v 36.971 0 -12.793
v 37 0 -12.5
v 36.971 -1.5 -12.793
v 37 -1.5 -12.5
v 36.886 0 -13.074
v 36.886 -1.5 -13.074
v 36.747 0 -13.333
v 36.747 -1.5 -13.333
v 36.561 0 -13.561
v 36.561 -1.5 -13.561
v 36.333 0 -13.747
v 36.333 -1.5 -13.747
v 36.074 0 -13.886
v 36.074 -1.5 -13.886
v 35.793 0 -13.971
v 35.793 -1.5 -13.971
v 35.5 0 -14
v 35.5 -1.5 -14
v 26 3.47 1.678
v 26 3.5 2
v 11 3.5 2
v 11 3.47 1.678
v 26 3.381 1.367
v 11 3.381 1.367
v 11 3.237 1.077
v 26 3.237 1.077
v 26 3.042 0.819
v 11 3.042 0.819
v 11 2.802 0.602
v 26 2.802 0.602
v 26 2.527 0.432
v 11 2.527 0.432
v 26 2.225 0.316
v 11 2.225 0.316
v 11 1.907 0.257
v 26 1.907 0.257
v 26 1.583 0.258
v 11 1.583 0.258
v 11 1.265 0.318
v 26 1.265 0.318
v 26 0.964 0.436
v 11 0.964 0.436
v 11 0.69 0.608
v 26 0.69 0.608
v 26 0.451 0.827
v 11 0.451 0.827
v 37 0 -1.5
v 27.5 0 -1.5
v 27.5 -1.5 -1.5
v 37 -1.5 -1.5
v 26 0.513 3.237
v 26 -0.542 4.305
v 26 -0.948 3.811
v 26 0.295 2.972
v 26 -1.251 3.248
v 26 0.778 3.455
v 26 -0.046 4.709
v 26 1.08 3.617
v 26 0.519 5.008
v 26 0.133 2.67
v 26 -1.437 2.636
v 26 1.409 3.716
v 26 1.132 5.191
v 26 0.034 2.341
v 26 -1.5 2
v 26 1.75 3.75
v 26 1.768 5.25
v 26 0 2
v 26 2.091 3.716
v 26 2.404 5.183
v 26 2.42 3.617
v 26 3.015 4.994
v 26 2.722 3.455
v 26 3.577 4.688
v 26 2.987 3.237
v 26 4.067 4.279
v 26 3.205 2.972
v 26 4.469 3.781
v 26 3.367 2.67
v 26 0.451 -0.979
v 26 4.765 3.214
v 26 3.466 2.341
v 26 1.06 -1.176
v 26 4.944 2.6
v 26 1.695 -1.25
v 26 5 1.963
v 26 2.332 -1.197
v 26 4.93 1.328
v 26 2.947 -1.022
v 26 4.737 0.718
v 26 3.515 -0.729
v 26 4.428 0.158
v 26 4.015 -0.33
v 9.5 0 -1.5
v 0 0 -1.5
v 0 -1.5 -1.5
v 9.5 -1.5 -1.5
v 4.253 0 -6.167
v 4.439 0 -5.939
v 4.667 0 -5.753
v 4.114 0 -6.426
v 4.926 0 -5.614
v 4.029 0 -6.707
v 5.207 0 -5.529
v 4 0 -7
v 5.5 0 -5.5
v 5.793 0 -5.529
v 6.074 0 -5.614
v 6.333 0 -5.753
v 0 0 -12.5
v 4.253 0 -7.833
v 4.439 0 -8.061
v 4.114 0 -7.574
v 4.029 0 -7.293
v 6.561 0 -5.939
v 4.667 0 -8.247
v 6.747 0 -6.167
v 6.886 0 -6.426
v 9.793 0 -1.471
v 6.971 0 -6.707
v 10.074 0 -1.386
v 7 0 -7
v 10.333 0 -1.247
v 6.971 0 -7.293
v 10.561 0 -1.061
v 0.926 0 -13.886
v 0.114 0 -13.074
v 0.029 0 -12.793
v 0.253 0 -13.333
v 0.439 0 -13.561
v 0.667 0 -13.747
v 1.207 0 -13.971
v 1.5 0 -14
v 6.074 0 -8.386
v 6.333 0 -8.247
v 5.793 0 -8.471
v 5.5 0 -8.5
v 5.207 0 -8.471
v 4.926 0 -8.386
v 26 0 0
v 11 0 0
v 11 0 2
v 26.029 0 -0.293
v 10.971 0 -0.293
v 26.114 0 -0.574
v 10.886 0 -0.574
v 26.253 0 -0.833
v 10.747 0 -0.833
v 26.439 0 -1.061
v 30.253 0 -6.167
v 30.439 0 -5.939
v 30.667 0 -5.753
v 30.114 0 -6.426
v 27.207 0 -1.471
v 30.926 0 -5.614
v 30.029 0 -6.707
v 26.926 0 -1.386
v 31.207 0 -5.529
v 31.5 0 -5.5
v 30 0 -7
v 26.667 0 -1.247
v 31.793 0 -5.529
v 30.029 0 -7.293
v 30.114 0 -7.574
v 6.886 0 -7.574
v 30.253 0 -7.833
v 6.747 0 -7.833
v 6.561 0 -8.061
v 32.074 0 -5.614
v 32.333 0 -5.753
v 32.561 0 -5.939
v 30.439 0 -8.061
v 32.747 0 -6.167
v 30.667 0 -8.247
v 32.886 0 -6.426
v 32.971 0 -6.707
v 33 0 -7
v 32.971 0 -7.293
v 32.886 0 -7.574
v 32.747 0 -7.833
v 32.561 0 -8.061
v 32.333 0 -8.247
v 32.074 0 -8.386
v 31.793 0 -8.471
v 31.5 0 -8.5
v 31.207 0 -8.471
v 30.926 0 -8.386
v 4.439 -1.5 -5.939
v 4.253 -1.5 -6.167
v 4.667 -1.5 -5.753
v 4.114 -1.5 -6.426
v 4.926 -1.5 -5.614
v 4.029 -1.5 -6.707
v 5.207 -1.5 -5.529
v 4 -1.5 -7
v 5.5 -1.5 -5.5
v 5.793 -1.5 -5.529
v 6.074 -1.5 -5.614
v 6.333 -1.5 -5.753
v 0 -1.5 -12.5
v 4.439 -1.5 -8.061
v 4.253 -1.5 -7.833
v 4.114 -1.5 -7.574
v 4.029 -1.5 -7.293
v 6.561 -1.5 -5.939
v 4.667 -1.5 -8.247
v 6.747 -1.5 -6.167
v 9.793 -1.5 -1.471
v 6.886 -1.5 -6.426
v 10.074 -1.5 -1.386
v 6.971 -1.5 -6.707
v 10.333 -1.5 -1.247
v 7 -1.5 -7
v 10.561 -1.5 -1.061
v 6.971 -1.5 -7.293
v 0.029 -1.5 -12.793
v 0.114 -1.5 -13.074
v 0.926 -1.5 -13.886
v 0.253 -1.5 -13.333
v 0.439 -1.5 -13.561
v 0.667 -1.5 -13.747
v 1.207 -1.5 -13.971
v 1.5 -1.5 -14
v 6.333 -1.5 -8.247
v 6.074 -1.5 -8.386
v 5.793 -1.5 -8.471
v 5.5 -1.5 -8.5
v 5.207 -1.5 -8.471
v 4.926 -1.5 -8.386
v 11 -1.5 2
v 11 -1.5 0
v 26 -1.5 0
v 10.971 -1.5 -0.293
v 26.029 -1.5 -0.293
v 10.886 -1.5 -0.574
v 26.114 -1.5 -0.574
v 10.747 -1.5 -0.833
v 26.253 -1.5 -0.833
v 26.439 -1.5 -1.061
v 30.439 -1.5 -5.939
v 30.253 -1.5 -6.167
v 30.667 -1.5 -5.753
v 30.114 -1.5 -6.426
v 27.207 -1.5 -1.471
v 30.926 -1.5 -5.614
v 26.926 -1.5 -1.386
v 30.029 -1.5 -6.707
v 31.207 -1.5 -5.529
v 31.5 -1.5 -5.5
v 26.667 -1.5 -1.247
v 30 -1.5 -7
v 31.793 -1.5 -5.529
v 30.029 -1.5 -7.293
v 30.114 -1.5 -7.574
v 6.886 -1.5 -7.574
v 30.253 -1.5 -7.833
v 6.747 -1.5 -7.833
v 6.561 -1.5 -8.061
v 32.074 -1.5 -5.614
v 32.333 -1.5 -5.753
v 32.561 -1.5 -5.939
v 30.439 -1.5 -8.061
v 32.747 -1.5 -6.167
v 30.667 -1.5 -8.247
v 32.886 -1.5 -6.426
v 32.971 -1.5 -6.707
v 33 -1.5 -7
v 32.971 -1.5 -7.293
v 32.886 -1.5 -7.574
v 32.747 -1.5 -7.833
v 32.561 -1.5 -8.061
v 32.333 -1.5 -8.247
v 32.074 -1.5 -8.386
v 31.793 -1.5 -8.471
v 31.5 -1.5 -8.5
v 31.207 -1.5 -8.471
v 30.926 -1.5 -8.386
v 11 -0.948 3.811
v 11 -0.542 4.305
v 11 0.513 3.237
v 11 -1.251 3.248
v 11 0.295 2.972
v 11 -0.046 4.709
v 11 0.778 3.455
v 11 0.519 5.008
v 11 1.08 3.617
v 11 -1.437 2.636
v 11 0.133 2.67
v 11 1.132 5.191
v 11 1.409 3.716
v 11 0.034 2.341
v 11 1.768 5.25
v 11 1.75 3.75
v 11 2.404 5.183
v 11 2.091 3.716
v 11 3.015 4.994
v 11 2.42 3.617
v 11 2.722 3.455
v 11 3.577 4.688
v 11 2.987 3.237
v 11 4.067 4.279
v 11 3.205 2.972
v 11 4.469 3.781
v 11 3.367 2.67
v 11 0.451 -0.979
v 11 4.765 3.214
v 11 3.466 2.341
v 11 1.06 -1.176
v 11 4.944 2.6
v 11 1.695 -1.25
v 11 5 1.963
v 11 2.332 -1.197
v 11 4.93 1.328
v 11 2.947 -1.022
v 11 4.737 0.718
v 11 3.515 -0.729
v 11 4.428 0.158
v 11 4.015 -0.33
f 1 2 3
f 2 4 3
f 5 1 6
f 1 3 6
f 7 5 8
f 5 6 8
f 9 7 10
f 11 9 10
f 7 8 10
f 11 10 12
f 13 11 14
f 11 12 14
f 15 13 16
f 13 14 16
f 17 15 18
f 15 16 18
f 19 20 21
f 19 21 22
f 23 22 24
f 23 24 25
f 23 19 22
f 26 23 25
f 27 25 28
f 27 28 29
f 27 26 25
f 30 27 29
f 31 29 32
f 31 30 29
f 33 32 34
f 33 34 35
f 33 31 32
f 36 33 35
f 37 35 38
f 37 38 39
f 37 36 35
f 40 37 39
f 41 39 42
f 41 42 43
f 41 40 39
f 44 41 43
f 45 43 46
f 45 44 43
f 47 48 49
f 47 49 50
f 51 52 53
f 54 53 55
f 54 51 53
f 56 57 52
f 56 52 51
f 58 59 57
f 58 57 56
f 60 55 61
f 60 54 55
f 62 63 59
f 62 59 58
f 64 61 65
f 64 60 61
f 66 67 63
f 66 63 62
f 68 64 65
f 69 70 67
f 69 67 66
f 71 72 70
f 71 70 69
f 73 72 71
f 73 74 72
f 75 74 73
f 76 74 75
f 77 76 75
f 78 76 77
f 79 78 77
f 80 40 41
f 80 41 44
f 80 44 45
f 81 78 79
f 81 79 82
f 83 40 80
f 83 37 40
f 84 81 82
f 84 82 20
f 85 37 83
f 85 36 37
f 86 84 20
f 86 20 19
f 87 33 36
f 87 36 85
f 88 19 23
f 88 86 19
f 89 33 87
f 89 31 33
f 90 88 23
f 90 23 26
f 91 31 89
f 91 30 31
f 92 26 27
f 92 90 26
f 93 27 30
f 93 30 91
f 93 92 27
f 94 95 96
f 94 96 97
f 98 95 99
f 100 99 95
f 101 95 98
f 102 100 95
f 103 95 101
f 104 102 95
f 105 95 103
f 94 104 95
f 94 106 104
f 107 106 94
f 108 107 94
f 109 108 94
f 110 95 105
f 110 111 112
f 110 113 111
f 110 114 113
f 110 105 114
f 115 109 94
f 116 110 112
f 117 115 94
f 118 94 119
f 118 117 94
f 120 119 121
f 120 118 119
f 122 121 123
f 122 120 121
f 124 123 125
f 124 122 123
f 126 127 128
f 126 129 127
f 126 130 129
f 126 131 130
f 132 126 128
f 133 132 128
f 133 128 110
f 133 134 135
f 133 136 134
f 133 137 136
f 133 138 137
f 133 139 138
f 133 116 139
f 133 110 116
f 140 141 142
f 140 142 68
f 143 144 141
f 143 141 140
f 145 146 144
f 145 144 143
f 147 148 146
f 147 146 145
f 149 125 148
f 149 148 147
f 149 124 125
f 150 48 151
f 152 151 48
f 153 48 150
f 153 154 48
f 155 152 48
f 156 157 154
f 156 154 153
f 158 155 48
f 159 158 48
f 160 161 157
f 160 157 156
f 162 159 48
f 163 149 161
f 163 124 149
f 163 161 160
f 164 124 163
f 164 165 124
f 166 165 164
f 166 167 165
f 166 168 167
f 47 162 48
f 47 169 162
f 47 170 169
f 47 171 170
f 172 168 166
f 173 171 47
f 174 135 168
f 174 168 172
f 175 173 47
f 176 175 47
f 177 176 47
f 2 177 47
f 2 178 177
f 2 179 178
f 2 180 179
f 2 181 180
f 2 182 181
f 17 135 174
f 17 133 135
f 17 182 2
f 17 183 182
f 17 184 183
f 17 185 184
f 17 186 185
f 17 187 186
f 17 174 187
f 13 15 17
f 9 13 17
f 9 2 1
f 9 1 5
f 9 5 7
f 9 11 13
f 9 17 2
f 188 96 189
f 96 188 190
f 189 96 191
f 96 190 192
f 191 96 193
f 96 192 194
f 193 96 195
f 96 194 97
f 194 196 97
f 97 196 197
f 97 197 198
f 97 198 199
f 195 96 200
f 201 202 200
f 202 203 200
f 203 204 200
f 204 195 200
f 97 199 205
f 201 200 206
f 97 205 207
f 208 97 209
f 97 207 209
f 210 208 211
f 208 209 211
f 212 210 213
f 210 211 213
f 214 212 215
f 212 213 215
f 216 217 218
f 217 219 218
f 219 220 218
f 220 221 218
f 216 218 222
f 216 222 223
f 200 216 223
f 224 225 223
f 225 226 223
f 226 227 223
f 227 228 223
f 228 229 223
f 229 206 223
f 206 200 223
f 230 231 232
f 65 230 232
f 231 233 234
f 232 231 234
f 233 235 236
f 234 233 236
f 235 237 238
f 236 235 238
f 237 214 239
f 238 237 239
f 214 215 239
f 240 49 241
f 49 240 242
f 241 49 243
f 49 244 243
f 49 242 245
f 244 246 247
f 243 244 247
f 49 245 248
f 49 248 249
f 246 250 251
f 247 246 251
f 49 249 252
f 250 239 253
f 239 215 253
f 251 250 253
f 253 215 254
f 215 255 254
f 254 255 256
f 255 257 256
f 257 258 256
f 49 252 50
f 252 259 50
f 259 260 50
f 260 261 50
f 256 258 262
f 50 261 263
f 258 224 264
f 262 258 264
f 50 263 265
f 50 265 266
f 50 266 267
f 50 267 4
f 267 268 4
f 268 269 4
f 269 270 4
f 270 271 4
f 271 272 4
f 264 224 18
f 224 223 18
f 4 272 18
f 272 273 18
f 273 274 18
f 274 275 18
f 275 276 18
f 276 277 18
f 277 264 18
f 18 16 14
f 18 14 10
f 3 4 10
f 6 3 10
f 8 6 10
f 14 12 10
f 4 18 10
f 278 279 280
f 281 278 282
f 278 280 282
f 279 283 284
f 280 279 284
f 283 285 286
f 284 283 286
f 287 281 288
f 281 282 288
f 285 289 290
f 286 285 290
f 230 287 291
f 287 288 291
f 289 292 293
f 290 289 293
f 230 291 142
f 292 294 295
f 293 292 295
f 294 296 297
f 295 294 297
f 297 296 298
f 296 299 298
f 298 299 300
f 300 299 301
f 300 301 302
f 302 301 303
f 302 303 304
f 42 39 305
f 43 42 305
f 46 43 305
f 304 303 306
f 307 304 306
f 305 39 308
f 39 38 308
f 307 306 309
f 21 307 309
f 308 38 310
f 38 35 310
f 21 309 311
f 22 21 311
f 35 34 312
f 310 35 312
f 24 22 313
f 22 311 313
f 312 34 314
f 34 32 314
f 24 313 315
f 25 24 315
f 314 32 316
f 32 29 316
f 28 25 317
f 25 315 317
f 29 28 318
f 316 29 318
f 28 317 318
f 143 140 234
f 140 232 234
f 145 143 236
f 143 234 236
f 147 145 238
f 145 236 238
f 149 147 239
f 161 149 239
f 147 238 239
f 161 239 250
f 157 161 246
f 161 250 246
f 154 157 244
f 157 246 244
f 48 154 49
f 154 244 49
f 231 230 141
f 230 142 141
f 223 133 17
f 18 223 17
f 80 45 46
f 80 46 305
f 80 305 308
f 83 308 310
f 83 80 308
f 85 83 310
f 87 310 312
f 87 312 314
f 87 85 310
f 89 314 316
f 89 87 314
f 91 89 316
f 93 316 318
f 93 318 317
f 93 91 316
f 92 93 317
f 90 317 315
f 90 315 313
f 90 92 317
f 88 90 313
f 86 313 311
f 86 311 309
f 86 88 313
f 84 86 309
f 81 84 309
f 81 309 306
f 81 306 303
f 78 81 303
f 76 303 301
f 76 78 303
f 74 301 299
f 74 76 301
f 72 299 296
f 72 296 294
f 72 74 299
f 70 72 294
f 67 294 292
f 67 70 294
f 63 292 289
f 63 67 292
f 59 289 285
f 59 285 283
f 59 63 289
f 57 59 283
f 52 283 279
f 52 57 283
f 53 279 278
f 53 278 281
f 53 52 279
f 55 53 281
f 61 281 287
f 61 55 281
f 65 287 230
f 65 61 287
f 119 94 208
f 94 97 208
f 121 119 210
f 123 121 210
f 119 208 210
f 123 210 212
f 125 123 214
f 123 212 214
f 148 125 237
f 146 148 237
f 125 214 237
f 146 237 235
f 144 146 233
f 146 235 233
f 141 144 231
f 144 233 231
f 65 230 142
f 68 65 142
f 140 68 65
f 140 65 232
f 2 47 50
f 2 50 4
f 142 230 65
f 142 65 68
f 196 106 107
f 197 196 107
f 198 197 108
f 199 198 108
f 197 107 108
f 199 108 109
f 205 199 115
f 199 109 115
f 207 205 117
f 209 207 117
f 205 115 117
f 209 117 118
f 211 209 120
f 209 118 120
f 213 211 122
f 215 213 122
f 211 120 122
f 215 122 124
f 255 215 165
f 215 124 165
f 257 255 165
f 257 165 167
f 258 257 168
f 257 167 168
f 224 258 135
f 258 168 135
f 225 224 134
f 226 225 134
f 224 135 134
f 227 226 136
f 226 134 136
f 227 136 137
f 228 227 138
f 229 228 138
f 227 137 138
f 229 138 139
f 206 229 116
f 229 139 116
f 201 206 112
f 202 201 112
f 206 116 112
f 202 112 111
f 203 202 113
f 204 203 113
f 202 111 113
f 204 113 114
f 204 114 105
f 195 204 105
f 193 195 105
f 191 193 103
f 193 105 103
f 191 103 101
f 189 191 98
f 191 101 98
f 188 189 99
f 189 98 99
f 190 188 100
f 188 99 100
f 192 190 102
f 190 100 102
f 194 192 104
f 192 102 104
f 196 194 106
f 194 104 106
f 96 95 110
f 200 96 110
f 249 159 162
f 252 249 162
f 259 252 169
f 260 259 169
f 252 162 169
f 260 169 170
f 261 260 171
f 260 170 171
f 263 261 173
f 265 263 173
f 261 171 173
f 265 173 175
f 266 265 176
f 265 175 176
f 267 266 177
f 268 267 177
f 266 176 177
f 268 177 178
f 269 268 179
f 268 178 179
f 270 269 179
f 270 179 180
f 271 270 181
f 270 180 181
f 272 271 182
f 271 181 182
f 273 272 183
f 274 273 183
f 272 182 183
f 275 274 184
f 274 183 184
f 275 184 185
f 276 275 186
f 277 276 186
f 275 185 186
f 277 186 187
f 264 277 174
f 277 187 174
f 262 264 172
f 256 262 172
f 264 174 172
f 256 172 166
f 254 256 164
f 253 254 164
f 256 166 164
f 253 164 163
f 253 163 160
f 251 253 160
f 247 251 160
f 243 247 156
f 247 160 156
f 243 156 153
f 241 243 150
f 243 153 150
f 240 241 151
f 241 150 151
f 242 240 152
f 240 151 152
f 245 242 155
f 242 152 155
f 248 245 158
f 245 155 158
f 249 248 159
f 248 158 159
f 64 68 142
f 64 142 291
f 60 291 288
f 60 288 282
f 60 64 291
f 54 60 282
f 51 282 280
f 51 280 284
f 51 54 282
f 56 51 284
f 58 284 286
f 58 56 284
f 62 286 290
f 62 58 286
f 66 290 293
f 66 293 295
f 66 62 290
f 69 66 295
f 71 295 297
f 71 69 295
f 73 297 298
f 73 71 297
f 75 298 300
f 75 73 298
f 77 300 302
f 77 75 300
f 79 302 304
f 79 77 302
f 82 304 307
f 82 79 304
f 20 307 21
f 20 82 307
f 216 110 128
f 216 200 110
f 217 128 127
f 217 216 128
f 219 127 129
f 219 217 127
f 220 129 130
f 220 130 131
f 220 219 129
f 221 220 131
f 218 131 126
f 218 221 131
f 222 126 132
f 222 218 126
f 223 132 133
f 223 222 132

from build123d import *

# Parameters (mm, degrees)
SKETCH_1_W             = 37
SKETCH_1_H             = 14
SKETCH_1_R             = 1.5
SM_BASE_FLANGE_1_DEPTH = 1.5
SKETCH_7_W             = 2
SKETCH_7_H             = 1.5
EXTRUDE_1_DEPTH        = 15
SM_BASE_FLANGE_2_DEPTH = 15
SKETCH_11_W            = 11
SKETCH_11_H            = 1.5
CUT_EXTRUDE_1_DEPTH    = 15
FILLET_1_R             = 1.5
FILLET_2_R             = 1.5


# Sheet-metal steps are written as plain solids
with BuildPart() as part:
    # Sketch 1 → 基体-法兰1 (new body)
    with BuildSketch(Plane(origin=(0, 0, 0), x_dir=(1, 0, 0), z_dir=(0, 1, 0))):
        with Locations((18.5, 7)):
            Rectangle(SKETCH_1_W, SKETCH_1_H)
        with Locations(Location((5.5, 7, 0), (0, 0, 270))):
            Circle(SKETCH_1_R, mode=Mode.SUBTRACT)
        with Locations(Location((31.5, 7, 0), (0, 0, 270))):
            Circle(SKETCH_1_R, mode=Mode.SUBTRACT)
    extrude(amount=-SM_BASE_FLANGE_1_DEPTH)

    # 草图7 → 凸台-拉伸1 (add)
    with BuildSketch(Plane(origin=(26, 0, 0), x_dir=(0, 0, -1), z_dir=(1, 0, 0))):
        with Locations((-1, -0.75)):
            Rectangle(SKETCH_7_W, SKETCH_7_H)
    extrude(amount=-EXTRUDE_1_DEPTH)

    # 草图11 → 切除-拉伸1 (cut)
    with BuildSketch(Plane(origin=(0, 0, 0), x_dir=(1, 0, 0), z_dir=(0, 1, 0))):
        with Locations((5.5, 0.75)):
            Rectangle(SKETCH_11_W, SKETCH_11_H)
        with Locations((31.5, 0.75)):
            Rectangle(SKETCH_11_W, SKETCH_11_H)
    extrude(amount=-CUT_EXTRUDE_1_DEPTH, mode=Mode.SUBTRACT)

    # 圆角1
    fillet_1_edges = [part.edges().sort_by_distance(p)[0] for p in [
        (0, -0.75, -14),
        (37, -0.75, -14),
    ]]
    fillet(fillet_1_edges, radius=FILLET_1_R)

    # 圆角2
    fillet_2_edges = [part.edges().sort_by_distance(p)[0] for p in [
        (11, -0.75, -1.5),
        (26, -0.75, -1.5),
    ]]
    fillet(fillet_2_edges, radius=FILLET_2_R)


with BuildPart() as body_2:
    # 草图8 → 基体-法兰2 (new body)
    with BuildSketch(Plane(origin=(26, 0, 0), x_dir=(0, 0, -1), z_dir=(1, 0, 0))):
        with BuildLine():
            Line((-0.826864003, 0.451442364), (0.979303286, 0.451442364))
            ThreePointArc((0.979303286, 0.451442364), (-3.780756536, 4.468714063), (-2, -1.5))
            Line((-2, -1.5), (-2, 0))
            ThreePointArc((-2, 0), (-3.75, 1.75), (-2, 3.5))
            ThreePointArc((-2, 3.5), (-0.366755398, 2.378499856), (-0.826864003, 0.451442364))
        make_face()
    extrude(amount=-SM_BASE_FLANGE_2_DEPTH)


solid = Compound([part.part, body_2.part])
